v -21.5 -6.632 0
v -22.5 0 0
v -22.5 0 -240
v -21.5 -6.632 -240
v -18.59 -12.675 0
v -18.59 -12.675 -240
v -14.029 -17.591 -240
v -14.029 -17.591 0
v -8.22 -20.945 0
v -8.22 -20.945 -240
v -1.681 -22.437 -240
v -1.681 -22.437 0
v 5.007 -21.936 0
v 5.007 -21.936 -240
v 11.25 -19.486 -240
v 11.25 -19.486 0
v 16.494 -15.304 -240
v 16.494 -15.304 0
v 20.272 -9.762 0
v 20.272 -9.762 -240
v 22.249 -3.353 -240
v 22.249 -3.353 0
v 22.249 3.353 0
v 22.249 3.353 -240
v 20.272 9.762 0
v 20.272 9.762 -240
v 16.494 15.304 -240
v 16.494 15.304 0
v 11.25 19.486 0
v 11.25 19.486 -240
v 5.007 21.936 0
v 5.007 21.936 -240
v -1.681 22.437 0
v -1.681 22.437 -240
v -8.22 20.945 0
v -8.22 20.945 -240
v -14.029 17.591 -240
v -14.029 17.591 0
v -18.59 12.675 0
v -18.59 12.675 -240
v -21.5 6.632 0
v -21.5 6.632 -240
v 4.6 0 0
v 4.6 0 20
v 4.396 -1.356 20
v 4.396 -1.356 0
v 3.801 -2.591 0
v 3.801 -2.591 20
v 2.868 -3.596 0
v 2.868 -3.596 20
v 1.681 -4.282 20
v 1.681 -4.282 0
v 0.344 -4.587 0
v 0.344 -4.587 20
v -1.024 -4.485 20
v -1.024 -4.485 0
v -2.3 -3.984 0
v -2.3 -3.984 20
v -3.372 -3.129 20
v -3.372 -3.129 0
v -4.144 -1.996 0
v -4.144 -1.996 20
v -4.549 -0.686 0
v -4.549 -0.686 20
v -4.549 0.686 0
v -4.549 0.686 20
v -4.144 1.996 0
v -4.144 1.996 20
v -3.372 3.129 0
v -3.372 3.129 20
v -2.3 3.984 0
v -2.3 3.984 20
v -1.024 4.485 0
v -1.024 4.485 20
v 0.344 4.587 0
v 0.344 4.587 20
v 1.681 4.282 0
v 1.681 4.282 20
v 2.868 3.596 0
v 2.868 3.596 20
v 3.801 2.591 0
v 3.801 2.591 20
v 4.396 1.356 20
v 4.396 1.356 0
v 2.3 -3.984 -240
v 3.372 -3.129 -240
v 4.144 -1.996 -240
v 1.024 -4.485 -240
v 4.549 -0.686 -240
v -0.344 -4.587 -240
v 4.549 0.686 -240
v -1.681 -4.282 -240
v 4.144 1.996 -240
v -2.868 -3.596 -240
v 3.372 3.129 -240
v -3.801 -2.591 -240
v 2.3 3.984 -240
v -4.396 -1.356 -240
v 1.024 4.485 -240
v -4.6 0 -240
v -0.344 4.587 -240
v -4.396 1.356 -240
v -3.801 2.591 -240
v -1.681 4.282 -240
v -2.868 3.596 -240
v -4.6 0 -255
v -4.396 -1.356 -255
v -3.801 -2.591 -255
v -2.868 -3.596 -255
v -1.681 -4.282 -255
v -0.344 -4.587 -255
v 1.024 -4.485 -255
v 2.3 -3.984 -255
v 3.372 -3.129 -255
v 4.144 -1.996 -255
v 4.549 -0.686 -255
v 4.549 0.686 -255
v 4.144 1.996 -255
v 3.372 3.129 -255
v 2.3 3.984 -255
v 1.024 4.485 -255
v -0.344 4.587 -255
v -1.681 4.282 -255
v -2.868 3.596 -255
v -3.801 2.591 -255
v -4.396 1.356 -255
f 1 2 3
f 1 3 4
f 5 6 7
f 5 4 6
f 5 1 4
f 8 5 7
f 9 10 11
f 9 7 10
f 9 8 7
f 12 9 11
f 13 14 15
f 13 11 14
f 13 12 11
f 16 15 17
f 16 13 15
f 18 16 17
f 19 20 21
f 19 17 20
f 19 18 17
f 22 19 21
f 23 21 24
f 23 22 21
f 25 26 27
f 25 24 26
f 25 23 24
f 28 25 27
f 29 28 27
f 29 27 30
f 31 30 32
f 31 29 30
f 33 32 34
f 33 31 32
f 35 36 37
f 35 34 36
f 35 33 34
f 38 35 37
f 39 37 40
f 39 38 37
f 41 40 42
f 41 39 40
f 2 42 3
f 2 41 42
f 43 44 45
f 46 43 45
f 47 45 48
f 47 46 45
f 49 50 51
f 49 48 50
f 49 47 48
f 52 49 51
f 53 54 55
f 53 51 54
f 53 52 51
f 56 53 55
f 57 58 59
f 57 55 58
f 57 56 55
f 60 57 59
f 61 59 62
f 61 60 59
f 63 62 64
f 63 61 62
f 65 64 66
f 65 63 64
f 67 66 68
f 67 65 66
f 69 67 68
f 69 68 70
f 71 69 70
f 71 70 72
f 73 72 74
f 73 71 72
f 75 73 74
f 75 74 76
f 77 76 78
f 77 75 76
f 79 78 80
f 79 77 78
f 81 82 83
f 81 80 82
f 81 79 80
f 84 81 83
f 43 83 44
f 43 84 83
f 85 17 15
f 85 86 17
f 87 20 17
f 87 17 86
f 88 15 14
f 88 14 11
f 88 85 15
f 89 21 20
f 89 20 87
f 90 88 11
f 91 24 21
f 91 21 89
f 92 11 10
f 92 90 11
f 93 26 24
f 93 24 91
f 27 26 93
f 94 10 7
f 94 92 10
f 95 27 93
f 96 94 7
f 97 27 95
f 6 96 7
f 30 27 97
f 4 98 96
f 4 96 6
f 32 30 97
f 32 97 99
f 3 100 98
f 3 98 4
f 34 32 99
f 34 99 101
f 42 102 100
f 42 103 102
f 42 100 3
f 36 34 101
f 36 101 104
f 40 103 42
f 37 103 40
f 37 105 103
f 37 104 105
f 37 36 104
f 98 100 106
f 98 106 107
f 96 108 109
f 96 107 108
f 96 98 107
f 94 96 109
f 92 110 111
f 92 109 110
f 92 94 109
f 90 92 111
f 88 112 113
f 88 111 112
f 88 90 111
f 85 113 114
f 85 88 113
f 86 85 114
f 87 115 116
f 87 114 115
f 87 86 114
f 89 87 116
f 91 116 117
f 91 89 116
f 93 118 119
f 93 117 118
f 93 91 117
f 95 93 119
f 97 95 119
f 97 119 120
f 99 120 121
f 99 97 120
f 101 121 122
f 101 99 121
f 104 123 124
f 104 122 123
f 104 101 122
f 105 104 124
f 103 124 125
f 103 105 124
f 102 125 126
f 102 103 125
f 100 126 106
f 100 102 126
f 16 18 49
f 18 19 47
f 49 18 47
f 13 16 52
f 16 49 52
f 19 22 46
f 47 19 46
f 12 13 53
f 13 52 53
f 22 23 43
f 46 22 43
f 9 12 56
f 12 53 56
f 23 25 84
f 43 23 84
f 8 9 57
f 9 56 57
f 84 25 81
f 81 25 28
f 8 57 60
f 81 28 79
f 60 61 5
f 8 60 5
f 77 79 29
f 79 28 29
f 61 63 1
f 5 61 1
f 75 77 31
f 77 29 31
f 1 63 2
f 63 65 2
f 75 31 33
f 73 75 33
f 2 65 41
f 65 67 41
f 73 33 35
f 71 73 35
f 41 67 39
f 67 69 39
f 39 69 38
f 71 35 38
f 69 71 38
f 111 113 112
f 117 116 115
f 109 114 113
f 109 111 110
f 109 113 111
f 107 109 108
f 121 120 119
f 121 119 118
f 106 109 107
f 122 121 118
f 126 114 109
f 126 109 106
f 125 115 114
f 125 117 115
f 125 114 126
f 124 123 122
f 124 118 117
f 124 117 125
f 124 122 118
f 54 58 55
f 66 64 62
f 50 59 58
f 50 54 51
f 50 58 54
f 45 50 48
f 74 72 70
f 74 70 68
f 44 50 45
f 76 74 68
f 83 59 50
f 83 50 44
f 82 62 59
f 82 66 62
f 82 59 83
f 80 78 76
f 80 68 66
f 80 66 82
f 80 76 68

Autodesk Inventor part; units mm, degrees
ref_plane "YZ Plane" through (0, 0, 0) normal (1, 0, 0) x (0, 1, 0)
ref_plane "XZ Plane" through (0, 0, 0) normal (0, 1, 0) x (-1, 0, 0)
ref_plane "XY Plane" through (0, 0, 0) normal (0, 0, 1) x (1, 0, 0)
sketch "草图1" plane through (0, 0, 0) normal (0, 0, 1) x (1, 0, 0)
  circle A0 centre (0, 0) radius 4.6
  dimension "d0" = 9.2
extrude "拉伸1" add sketch "草图1" along normal blind 20
sketch "草图2" plane through (0, 0, 0) normal (0, 0, -1) x (-1, 0, 0)
  circle A0 centre (0, 0) radius 4.6 projected
  circle A1 centre (0, 0) radius 22.5
  dimension "d3" = 45
extrude "拉伸2" add sketch "草图2" along normal blind 240 contours A0 | A1
sketch "草图3" plane through (0, 0, -240) normal (0, 0, -1) x (-1, 0, 0)
  circle A0 centre (0, 0) radius 4.6 projected
  circle A1 centre (0, 0) radius 4.6
extrude "拉伸3" add sketch "草图3" along normal blind 15
properties part number "滚轴2"
